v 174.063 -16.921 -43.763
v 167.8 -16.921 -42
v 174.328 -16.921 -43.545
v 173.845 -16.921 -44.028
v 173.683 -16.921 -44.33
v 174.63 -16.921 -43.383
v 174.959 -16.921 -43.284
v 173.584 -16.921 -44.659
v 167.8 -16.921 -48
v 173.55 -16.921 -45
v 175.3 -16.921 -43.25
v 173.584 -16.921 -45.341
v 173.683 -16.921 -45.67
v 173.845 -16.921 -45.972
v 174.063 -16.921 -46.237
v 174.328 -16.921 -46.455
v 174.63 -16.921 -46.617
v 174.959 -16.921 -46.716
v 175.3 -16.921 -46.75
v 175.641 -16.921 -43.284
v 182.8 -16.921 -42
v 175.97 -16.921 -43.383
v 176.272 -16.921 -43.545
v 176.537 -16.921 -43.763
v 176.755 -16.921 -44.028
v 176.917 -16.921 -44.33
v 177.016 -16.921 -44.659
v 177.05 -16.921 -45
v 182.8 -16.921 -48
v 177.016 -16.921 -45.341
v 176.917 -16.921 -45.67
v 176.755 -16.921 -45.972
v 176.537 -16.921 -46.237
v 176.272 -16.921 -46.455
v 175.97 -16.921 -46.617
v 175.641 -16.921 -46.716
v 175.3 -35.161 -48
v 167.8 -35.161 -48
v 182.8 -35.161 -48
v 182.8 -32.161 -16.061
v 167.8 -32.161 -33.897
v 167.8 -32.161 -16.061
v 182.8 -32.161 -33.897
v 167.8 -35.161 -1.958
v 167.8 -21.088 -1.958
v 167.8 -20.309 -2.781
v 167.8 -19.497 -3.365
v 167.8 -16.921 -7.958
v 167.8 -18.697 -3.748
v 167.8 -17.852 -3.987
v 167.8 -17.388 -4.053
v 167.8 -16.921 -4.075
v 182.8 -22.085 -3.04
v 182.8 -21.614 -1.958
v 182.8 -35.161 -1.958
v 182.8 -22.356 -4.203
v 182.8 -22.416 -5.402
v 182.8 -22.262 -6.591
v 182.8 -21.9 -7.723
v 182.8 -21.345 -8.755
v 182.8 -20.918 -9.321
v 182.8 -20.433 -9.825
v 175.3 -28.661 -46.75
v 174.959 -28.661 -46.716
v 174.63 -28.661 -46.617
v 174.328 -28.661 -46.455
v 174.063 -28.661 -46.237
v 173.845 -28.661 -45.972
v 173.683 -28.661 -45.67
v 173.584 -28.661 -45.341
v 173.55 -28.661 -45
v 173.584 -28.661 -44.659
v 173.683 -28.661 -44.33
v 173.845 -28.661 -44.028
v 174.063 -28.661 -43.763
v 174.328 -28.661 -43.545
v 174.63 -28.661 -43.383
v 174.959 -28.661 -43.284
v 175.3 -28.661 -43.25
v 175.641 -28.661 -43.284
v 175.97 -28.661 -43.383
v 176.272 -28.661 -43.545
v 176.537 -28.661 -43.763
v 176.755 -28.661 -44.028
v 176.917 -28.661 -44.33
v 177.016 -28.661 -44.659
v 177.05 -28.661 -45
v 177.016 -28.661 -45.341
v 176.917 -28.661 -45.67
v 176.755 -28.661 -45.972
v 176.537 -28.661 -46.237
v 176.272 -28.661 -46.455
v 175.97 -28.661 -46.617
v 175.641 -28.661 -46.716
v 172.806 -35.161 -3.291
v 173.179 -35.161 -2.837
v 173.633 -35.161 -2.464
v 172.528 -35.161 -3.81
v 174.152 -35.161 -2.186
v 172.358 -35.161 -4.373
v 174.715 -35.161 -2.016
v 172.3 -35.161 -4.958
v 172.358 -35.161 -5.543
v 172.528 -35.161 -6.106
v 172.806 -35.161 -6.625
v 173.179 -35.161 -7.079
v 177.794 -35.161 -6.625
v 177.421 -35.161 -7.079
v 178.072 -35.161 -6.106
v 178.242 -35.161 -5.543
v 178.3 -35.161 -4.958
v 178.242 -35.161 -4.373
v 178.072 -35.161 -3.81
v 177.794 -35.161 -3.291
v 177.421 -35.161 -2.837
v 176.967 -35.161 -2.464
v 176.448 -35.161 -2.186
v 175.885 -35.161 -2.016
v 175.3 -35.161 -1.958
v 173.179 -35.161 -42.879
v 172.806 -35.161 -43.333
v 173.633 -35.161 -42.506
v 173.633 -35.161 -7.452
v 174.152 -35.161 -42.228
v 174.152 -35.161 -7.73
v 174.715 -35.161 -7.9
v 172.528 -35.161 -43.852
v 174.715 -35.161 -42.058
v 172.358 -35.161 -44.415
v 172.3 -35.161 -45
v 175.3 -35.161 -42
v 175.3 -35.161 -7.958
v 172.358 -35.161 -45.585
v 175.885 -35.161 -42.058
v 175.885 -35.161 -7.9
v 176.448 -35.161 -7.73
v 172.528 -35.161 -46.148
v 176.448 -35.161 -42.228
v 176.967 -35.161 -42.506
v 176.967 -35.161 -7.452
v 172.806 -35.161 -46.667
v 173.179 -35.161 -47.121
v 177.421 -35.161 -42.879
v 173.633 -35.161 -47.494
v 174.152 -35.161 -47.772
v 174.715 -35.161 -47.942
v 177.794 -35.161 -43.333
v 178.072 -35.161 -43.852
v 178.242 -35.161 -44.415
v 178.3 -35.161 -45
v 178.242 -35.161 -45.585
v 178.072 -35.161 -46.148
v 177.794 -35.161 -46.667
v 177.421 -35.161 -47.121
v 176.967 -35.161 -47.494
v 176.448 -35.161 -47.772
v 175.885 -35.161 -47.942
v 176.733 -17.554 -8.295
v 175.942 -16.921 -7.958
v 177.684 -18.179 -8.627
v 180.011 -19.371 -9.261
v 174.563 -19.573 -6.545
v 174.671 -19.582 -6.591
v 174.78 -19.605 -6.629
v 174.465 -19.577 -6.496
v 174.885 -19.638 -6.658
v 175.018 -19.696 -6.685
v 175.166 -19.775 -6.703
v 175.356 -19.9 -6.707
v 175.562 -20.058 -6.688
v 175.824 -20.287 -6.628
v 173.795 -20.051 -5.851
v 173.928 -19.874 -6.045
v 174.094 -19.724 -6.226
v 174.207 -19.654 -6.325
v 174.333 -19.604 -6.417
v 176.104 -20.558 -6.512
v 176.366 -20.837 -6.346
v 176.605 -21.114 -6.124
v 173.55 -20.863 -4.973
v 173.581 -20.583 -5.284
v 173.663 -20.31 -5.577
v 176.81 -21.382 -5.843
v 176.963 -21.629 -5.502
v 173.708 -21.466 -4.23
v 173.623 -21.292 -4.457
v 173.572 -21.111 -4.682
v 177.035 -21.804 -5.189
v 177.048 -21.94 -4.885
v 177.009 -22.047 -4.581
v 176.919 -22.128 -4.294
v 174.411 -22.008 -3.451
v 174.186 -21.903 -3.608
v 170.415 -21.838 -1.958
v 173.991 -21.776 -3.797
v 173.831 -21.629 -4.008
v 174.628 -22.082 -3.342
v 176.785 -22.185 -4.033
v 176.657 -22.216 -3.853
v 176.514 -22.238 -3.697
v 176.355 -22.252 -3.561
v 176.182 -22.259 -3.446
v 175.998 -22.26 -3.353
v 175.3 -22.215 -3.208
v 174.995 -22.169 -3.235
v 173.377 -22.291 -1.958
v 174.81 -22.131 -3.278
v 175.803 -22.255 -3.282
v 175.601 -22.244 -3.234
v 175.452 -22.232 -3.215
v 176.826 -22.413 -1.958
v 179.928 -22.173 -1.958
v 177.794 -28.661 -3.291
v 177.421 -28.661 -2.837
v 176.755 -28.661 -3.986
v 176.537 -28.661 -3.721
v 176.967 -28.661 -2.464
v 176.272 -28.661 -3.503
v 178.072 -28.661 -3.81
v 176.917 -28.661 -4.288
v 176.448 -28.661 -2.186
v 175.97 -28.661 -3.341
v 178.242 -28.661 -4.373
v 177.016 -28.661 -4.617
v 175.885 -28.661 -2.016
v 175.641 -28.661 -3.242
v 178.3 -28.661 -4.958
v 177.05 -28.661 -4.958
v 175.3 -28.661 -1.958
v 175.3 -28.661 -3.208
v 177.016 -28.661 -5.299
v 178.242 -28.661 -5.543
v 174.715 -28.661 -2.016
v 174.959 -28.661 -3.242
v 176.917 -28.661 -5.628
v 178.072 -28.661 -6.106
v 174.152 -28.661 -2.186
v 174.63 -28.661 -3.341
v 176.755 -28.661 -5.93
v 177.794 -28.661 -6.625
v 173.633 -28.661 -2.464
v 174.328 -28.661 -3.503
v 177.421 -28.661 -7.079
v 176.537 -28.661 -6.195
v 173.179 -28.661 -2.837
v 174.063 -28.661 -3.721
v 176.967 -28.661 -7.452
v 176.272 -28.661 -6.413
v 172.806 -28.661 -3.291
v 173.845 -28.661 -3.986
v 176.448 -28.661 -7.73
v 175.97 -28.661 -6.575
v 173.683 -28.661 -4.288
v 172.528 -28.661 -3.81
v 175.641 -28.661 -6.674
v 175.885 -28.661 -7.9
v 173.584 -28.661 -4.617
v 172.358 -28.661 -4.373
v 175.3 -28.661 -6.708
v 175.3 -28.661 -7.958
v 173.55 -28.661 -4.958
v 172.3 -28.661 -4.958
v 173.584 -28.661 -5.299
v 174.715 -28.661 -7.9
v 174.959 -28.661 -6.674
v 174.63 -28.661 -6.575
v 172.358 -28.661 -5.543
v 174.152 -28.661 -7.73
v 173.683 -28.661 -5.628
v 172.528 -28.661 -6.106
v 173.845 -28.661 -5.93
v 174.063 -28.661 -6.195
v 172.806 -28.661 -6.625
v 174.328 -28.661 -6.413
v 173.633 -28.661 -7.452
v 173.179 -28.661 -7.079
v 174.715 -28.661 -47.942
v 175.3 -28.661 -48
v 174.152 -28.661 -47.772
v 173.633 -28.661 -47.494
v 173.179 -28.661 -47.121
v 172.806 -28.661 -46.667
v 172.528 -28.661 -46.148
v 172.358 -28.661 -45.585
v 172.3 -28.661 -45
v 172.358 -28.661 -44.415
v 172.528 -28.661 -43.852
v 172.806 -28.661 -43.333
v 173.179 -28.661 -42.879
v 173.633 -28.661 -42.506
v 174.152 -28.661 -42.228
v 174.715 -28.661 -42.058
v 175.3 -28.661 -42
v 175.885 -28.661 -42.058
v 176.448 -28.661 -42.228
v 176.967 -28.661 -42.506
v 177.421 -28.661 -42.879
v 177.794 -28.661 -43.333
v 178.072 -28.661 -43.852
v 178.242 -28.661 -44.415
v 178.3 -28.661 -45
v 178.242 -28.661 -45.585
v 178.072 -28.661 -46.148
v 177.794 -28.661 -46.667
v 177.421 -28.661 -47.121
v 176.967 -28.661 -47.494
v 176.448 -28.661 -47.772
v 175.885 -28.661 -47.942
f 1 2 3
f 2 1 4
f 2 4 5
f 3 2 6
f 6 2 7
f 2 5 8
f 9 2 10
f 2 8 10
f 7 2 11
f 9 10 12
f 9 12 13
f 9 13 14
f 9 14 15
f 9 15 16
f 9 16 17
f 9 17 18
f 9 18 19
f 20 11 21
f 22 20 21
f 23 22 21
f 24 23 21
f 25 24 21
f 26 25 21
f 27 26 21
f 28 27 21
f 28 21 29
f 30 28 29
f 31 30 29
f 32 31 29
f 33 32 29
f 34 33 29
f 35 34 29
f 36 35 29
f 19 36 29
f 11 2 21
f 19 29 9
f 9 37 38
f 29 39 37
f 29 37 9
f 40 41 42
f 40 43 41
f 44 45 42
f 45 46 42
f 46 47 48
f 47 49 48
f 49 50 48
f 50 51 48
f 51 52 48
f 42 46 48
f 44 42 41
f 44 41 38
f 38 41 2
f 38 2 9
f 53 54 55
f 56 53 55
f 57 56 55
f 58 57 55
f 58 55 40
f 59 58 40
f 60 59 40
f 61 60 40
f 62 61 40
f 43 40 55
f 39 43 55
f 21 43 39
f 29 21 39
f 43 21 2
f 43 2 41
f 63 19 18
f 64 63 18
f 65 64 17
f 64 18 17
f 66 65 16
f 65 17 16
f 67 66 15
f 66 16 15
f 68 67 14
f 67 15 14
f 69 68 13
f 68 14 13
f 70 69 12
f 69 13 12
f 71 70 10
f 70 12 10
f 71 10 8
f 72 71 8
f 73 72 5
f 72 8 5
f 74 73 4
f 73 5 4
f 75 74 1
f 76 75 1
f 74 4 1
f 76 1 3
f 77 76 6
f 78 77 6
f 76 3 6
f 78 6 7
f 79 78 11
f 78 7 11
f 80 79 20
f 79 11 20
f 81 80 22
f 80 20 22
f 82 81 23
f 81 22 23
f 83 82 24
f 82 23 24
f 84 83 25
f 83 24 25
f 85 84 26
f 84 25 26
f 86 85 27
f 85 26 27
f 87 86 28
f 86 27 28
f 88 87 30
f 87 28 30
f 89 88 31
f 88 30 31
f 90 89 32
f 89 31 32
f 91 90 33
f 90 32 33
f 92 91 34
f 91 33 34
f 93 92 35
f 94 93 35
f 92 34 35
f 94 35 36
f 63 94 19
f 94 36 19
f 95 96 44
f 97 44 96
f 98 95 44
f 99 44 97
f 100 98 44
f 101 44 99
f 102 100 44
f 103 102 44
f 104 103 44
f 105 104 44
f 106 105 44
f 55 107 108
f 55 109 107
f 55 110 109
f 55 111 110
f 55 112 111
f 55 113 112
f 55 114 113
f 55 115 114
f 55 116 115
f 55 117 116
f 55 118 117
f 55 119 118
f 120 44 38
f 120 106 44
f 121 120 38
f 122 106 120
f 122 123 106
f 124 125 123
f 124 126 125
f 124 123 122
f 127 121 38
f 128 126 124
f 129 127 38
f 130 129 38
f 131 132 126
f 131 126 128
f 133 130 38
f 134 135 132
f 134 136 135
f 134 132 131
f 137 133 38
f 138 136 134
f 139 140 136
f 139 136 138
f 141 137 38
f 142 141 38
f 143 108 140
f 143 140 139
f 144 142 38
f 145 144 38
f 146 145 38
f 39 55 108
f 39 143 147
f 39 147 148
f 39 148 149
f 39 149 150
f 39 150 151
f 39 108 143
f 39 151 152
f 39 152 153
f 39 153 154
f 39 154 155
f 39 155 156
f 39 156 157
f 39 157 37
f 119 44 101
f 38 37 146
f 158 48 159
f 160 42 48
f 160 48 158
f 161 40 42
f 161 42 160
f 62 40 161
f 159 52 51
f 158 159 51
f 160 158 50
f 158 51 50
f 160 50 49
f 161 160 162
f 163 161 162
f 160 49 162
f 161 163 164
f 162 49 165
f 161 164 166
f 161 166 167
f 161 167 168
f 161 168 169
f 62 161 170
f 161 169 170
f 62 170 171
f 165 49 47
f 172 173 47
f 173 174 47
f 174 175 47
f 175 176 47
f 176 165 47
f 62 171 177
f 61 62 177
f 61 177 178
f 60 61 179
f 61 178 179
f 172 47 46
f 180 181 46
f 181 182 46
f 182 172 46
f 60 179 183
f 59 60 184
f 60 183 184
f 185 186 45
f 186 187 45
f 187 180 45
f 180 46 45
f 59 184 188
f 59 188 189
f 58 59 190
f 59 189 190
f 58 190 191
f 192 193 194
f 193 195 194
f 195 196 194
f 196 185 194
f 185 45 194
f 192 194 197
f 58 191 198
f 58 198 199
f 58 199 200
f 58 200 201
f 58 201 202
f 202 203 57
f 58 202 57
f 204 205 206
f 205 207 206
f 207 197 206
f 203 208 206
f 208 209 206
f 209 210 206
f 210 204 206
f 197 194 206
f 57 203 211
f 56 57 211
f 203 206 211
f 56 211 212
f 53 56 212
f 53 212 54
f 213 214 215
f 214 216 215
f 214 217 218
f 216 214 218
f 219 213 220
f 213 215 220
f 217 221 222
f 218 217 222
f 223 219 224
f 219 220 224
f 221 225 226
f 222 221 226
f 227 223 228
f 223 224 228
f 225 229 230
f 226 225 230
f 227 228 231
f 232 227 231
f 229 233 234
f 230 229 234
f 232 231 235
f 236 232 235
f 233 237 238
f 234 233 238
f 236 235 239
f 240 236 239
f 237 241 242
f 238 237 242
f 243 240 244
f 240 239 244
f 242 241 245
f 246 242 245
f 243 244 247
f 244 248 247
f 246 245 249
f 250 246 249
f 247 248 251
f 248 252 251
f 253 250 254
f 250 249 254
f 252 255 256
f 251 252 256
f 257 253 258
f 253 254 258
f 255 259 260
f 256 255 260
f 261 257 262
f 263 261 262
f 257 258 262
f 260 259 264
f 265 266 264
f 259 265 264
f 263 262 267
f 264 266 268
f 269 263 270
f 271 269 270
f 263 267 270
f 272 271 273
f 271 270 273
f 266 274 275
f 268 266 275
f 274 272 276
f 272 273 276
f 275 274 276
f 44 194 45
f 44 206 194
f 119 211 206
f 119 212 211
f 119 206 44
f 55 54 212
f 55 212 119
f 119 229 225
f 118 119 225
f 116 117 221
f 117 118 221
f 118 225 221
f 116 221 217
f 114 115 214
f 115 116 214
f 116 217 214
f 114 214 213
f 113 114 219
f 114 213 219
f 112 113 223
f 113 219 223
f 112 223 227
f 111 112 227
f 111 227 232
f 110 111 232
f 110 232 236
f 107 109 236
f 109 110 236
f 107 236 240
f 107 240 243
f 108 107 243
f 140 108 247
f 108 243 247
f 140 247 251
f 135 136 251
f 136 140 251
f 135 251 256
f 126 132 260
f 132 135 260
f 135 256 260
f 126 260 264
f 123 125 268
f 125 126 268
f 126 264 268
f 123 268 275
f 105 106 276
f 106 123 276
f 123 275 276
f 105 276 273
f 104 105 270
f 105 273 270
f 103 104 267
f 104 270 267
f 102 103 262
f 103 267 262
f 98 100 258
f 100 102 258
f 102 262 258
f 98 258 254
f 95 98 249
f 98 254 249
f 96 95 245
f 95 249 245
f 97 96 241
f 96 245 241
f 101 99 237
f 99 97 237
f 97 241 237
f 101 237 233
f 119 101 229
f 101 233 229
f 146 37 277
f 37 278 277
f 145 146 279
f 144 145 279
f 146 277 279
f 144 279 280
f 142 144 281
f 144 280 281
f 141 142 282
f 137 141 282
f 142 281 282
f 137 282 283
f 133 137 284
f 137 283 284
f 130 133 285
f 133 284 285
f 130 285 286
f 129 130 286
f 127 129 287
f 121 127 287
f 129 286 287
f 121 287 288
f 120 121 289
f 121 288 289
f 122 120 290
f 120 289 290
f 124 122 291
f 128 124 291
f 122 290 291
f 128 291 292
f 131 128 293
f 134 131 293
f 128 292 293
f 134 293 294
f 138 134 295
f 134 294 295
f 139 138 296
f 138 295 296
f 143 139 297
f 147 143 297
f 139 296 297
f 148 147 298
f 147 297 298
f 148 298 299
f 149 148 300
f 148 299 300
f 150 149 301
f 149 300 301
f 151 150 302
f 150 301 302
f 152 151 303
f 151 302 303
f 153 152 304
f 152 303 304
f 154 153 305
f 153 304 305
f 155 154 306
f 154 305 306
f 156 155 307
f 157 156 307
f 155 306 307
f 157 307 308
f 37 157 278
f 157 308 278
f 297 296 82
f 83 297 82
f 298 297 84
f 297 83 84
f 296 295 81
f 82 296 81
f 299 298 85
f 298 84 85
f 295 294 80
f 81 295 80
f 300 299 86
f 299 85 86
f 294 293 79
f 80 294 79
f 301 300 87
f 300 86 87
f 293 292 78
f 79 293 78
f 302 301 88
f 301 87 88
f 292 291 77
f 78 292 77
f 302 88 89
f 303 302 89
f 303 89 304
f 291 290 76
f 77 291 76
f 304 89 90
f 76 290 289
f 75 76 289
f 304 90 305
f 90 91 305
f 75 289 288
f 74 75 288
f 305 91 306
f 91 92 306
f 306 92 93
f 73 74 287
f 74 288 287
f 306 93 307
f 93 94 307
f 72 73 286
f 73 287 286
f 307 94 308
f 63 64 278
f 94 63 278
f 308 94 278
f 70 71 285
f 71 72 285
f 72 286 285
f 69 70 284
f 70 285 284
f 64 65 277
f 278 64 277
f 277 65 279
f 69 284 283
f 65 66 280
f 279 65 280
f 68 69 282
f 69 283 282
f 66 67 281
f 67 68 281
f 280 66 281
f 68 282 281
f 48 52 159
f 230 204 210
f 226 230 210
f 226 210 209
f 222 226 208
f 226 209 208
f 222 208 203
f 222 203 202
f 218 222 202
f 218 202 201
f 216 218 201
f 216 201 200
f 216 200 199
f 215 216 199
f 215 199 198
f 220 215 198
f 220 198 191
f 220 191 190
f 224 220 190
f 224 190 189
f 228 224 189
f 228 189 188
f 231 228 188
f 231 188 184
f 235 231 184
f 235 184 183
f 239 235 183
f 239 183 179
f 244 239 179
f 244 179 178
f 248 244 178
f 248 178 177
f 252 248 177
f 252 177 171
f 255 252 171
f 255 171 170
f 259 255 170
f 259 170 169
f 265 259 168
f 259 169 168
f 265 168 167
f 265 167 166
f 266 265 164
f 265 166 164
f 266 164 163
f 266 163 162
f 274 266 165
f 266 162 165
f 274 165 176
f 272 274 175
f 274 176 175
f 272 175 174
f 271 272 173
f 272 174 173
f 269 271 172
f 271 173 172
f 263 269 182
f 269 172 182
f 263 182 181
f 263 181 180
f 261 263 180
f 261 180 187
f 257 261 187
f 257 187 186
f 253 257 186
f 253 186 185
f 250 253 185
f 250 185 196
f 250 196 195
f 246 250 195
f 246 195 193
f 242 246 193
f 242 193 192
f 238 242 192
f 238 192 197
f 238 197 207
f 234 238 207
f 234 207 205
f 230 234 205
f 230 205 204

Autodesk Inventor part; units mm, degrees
ref_plane "YZ Plane" through (0, 0, 0) normal (1, 0, 0) x (0, 1, 0)
ref_plane "XZ Plane" through (0, 0, 0) normal (0, 1, 0) x (-1, 0, 0)
ref_plane "Work Plane1" through (182.8, -16.921, -7.958) normal (0, -1, 0) x (0, 0, -1)
ref_plane "Work Plane2" through (182.8, -6.9868, -42.1222) normal (1, 0, 0) x (0, 0, -1)
sketch "Sketch1" plane through (182.8, -6.9868, -42.1222) normal (1, 0, 0) x (0, 0, -1)
  arc A0 (5.0194, 6.9868) -> (5.8778, 5.8182) centre (7.8778, 8.1868) ccw projected
  line L0 (-9.7772, 6.9868) -> (5.0194, 6.9868) projected
  arc A1 (-7.9865, 5.8774) -> (-9.7772, 6.9868) centre (-9.7772, 4.9868) ccw projected
  line L1 (-7.9865, 5.8774) -> (-0.1222, -9.9342) projected
  line L2 (-0.1222, -9.9342) -> (5.8778, -9.9342) projected
  line L3 (5.8778, -9.9342) -> (5.8778, 5.8182) projected
  line L4 (-42.1222, 6.9868) -> (-42.1222, -9.9342) projected
  line L5 (-42.1222, -9.9342) -> (-34.1642, -9.9342) projected
  line L6 (-34.1642, -9.9342) -> (-26.2998, 5.8774) projected
  arc A2 (-24.5091, 6.9868) -> (-26.2998, 5.8774) centre (-24.5091, 4.9868) ccw projected
  line L7 (-42.1222, 6.9868) -> (-24.5091, 6.9868) projected
  circle A3 centre (-17.1432, -9.9342) radius 15.24 construction
  line L8 (-17.1432, -9.9342) -> (-17.1432, -20.9232) construction
  line L9 (-17.1432, -9.9342) -> (-6.1542, -9.9342) construction
  line L10 (-0.1222, -9.9342) -> (-8.2255, -25.1742)
  line L11 (-0.1222, -9.9342) -> (17.1381, -9.9342) construction
  line L12 (-8.2255, -25.1742) -> (-17.1432, -25.1742)
  line L13 (-17.1432, -25.1742) -> (-17.1432, -28.1742)
  line L14 (-17.1432, -28.1742) -> (5.8778, -28.1742)
  line L15 (5.8778, -28.1742) -> (5.8778, -9.9342)
  line L16 (-0.1222, -9.9342) -> (5.8778, -9.9342)
  dimension "d0" = 90
  dimension "d1" = 118
  dimension "d2" = 3
  dimension "d3" = 90
ref_plane "Work Plane3" through (167.8, -16.921, -48) normal (-1, 0, 0) x (0, 0, 1)
extrude "Extrusion1" add sketch "Sketch1" against normal up to surface (15 mm away) contours L15 L14 L13 L12 L10 L2
sketch "Sketch2" plane through (182.8, -35.161, -48) normal (0, -1, 0) x (1, 0, 0)
  circle A0 centre (-7.5, 3) radius 1.45 projected
  point P0 (-182.8, 48)
hole "Hole1" at (175.3, -35.161, -45) direction (0, 1, 0) diameter 3.5 end through all counterbore diameter 6 counterbore depth 6.5
mirror "Mirror1" about plane through (182.8, -35.161, -24.979) normal (0, 0, 1) of "Extrusion1", "Hole1"
ref_plane "Work Plane4" through (119.0599, -16.9209, 25.2669) normal (0.9026, 0, -0.4305) x (0.4305, 0, 0.9026)
sketch "Sketch3" plane through (119.0599, -16.9209, 25.2669) normal (0.9026, 0, -0.4305) x (0.4305, 0, 0.9026)
  circle A0 centre (0, 0) radius 12.5
  circle A1 centre (0, 0) radius 5.5
  point P0 (-74.0621, -16.9209)
  dimension "d13" = 11
extrude "Extrusion2" cut sketch "Sketch3" along normal through all contours A1
properties part number "30_CUBE_openSIM_Lensfixation"
